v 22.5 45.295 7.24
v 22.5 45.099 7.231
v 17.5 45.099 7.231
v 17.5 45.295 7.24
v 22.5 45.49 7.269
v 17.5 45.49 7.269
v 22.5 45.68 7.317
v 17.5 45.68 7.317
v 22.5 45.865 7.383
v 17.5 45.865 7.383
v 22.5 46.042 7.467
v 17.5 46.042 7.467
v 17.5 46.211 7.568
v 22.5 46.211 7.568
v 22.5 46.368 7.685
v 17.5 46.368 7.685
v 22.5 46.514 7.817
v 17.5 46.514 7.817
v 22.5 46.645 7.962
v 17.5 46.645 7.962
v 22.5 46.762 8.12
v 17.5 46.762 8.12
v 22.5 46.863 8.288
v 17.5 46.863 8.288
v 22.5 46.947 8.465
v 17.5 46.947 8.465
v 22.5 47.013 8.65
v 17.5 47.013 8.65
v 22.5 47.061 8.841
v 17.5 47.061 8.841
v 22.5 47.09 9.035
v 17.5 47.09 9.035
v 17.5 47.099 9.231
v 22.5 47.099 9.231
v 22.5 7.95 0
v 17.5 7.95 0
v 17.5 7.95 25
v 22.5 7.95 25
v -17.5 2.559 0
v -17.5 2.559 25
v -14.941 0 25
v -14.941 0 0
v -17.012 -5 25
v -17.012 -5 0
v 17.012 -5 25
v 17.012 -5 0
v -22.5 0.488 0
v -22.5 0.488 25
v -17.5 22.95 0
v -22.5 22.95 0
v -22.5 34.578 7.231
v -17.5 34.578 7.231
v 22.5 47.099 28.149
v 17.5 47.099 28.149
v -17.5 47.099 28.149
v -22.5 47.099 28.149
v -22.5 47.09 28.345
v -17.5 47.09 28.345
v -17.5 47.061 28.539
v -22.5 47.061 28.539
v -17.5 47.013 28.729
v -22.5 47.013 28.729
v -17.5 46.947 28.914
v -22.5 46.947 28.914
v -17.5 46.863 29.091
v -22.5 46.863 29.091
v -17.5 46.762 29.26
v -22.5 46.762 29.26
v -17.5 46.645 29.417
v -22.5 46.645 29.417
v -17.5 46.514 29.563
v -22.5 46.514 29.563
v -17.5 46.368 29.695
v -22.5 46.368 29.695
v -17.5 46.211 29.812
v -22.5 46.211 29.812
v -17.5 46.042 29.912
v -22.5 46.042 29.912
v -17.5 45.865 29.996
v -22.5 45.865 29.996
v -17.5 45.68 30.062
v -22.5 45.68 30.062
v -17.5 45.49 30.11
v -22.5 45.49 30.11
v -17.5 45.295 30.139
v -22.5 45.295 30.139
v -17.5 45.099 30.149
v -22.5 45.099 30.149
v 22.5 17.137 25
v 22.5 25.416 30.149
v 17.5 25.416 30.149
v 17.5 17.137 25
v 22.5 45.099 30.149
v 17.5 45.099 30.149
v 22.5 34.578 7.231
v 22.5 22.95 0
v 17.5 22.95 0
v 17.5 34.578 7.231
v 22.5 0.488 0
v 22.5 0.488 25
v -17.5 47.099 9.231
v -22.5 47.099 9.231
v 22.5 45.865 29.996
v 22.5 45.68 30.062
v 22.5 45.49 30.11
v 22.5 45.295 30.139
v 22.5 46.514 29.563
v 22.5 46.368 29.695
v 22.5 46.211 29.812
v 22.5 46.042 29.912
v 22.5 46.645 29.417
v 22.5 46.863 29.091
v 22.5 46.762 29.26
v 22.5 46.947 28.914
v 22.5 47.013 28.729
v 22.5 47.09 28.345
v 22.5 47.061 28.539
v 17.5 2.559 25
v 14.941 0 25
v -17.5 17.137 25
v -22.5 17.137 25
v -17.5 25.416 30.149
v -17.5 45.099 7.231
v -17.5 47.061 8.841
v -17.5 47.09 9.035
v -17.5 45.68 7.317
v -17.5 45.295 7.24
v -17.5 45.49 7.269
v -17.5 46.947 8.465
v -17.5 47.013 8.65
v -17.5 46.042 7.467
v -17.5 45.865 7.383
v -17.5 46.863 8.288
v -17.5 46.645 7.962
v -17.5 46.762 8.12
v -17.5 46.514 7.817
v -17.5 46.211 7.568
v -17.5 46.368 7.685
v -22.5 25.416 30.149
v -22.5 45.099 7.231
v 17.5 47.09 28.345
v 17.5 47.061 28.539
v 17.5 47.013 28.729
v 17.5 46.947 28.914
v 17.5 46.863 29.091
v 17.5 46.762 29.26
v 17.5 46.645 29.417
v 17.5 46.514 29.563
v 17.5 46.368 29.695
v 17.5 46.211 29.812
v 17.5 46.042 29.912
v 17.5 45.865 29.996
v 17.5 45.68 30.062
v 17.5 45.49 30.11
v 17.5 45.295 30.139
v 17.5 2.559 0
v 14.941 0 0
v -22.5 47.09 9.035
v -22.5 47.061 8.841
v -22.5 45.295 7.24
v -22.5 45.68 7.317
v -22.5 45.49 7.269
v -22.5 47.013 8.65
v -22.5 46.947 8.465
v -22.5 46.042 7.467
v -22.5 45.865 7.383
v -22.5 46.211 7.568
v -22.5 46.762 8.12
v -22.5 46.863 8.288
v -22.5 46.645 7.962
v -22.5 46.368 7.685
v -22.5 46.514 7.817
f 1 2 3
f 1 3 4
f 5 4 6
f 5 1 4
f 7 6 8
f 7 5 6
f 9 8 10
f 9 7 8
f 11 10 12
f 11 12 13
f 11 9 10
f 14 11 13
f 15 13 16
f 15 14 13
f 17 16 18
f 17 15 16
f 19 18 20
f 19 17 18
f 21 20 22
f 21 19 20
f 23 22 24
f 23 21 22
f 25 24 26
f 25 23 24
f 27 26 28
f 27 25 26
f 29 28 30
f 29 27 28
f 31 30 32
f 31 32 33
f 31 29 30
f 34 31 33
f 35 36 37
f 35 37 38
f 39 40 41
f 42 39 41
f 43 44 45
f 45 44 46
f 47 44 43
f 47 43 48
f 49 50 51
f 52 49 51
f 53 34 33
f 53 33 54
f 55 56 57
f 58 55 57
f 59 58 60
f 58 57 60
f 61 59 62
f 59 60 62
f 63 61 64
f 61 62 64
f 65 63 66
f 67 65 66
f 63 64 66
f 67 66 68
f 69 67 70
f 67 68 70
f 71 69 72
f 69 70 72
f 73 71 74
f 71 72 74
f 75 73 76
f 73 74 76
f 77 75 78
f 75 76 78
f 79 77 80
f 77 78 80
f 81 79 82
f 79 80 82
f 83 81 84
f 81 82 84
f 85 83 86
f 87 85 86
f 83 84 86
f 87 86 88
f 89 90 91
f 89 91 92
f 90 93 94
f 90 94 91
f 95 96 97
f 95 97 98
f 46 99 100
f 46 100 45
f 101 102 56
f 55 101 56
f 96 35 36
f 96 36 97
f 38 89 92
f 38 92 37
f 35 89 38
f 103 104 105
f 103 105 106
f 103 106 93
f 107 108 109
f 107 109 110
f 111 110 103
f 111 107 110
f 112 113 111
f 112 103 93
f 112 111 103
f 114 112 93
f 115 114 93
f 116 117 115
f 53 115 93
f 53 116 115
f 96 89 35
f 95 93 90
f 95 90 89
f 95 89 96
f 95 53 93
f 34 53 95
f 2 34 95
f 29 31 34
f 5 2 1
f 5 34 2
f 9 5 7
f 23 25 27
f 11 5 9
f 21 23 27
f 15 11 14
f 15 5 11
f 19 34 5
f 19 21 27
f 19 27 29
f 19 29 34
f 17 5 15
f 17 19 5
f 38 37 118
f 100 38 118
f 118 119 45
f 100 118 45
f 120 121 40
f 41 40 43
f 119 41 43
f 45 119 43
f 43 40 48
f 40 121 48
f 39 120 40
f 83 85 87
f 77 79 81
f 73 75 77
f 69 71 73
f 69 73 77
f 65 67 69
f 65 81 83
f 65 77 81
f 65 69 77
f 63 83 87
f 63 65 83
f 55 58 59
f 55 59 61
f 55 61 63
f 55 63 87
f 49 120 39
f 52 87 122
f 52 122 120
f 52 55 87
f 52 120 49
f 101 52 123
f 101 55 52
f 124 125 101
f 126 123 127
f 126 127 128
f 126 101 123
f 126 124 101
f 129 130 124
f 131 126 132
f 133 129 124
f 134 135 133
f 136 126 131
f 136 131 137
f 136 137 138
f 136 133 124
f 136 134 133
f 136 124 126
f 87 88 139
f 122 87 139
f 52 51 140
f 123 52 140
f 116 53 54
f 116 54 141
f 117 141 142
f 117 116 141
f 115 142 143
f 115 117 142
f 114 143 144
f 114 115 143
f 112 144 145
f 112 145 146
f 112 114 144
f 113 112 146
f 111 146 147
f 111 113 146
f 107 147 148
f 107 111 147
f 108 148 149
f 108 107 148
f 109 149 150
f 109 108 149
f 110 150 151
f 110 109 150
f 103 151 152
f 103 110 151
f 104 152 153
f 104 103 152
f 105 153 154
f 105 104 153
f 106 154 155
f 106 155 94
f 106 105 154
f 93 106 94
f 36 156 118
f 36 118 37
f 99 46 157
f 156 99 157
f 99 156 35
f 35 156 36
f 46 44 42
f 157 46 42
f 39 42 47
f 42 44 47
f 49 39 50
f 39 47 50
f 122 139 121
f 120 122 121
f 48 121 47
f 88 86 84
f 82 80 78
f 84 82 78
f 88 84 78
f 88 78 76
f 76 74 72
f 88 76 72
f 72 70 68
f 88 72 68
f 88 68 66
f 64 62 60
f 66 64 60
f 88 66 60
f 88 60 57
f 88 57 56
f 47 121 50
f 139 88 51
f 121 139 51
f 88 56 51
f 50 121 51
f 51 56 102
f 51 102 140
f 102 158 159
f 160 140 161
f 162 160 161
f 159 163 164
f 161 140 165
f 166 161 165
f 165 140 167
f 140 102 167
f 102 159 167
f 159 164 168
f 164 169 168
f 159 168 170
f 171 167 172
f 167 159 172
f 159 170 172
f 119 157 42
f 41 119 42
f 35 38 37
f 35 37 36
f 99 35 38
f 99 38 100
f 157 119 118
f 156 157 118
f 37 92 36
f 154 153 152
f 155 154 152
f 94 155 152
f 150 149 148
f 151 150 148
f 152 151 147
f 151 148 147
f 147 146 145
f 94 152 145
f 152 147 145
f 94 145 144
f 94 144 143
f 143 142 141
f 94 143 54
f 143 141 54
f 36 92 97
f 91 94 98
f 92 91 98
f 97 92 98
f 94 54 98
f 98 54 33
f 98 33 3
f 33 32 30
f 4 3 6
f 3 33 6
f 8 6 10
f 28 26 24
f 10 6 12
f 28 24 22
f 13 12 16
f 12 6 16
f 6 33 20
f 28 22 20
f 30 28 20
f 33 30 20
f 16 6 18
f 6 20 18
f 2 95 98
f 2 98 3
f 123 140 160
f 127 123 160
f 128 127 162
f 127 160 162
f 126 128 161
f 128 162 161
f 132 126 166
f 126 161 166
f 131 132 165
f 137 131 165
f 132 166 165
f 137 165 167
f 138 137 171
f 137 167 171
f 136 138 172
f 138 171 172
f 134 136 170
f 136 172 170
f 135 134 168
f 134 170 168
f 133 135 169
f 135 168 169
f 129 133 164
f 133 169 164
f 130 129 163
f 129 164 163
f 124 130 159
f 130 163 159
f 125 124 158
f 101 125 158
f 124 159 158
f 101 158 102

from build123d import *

# Parameters (mm, degrees)
BOSS_EXTRUDE1_DEPTH = 25
BOSS_EXTRUDE3_DEPTH = 5


with BuildPart() as part:
    # Sketch1 → Boss-Extrude1 (new body)
    with BuildSketch(Plane.XY):
        Polygon((-17.5, 7.949579473), (-17.5, 2.559294279), (-14.940705721, 0), (0, 0), (14.940705721, 0), (17.5, 2.559294279), (17.5, 7.949579473), (22.5, 7.949579473), (22.5, 0.488226467), (17.011773533, -5), (0, -5), (-17.011773533, -5), (-22.5, 0.488226467), (-22.5, 7.949579473), align=None)
    extrude(amount=BOSS_EXTRUDE1_DEPTH)


with BuildPart() as body_2:
    # Sketch3 → Boss-Extrude3 (new body)
    with BuildSketch(Plane(origin=(22.5, 0, 0), x_dir=(0, 0, -1), z_dir=(1, 0, 0))):
        with BuildLine():
            Line((-25, 7.949579473), (0, 7.949579473))
            Line((0, 7.949579473), (0, 22.949579473))
            Line((0, 22.949579473), (-7.230778036, 34.577519471))
            Line((-7.230778036, 34.577519471), (-7.230778036, 45.099433505))
            ThreePointArc((-7.230778036, 45.099433505), (-7.816564474, 46.513647067), (-9.230778036, 47.099433505))
            Line((-9.230778036, 47.099433505), (-28.148577305, 47.099433505))
            ThreePointArc((-28.148577305, 47.099433505), (-29.562790867, 46.513647067), (-30.148577305, 45.099433505))
            Line((-30.148577305, 45.099433505), (-30.148577305, 25.416180597))
            Line((-30.148577305, 25.416180597), (-25, 17.136663832))
            Line((-25, 17.136663832), (-25, 7.949579473))
        make_face()
    boss_extrude3 = extrude(amount=-BOSS_EXTRUDE3_DEPTH)


with BuildPart() as part_1:
    add(part.part)

    # Mirror5: Boss-Extrude3 across plane
    add(boss_extrude3.mirror(Plane.ZY))


solid = Compound([body_2.part, part_1.part])
